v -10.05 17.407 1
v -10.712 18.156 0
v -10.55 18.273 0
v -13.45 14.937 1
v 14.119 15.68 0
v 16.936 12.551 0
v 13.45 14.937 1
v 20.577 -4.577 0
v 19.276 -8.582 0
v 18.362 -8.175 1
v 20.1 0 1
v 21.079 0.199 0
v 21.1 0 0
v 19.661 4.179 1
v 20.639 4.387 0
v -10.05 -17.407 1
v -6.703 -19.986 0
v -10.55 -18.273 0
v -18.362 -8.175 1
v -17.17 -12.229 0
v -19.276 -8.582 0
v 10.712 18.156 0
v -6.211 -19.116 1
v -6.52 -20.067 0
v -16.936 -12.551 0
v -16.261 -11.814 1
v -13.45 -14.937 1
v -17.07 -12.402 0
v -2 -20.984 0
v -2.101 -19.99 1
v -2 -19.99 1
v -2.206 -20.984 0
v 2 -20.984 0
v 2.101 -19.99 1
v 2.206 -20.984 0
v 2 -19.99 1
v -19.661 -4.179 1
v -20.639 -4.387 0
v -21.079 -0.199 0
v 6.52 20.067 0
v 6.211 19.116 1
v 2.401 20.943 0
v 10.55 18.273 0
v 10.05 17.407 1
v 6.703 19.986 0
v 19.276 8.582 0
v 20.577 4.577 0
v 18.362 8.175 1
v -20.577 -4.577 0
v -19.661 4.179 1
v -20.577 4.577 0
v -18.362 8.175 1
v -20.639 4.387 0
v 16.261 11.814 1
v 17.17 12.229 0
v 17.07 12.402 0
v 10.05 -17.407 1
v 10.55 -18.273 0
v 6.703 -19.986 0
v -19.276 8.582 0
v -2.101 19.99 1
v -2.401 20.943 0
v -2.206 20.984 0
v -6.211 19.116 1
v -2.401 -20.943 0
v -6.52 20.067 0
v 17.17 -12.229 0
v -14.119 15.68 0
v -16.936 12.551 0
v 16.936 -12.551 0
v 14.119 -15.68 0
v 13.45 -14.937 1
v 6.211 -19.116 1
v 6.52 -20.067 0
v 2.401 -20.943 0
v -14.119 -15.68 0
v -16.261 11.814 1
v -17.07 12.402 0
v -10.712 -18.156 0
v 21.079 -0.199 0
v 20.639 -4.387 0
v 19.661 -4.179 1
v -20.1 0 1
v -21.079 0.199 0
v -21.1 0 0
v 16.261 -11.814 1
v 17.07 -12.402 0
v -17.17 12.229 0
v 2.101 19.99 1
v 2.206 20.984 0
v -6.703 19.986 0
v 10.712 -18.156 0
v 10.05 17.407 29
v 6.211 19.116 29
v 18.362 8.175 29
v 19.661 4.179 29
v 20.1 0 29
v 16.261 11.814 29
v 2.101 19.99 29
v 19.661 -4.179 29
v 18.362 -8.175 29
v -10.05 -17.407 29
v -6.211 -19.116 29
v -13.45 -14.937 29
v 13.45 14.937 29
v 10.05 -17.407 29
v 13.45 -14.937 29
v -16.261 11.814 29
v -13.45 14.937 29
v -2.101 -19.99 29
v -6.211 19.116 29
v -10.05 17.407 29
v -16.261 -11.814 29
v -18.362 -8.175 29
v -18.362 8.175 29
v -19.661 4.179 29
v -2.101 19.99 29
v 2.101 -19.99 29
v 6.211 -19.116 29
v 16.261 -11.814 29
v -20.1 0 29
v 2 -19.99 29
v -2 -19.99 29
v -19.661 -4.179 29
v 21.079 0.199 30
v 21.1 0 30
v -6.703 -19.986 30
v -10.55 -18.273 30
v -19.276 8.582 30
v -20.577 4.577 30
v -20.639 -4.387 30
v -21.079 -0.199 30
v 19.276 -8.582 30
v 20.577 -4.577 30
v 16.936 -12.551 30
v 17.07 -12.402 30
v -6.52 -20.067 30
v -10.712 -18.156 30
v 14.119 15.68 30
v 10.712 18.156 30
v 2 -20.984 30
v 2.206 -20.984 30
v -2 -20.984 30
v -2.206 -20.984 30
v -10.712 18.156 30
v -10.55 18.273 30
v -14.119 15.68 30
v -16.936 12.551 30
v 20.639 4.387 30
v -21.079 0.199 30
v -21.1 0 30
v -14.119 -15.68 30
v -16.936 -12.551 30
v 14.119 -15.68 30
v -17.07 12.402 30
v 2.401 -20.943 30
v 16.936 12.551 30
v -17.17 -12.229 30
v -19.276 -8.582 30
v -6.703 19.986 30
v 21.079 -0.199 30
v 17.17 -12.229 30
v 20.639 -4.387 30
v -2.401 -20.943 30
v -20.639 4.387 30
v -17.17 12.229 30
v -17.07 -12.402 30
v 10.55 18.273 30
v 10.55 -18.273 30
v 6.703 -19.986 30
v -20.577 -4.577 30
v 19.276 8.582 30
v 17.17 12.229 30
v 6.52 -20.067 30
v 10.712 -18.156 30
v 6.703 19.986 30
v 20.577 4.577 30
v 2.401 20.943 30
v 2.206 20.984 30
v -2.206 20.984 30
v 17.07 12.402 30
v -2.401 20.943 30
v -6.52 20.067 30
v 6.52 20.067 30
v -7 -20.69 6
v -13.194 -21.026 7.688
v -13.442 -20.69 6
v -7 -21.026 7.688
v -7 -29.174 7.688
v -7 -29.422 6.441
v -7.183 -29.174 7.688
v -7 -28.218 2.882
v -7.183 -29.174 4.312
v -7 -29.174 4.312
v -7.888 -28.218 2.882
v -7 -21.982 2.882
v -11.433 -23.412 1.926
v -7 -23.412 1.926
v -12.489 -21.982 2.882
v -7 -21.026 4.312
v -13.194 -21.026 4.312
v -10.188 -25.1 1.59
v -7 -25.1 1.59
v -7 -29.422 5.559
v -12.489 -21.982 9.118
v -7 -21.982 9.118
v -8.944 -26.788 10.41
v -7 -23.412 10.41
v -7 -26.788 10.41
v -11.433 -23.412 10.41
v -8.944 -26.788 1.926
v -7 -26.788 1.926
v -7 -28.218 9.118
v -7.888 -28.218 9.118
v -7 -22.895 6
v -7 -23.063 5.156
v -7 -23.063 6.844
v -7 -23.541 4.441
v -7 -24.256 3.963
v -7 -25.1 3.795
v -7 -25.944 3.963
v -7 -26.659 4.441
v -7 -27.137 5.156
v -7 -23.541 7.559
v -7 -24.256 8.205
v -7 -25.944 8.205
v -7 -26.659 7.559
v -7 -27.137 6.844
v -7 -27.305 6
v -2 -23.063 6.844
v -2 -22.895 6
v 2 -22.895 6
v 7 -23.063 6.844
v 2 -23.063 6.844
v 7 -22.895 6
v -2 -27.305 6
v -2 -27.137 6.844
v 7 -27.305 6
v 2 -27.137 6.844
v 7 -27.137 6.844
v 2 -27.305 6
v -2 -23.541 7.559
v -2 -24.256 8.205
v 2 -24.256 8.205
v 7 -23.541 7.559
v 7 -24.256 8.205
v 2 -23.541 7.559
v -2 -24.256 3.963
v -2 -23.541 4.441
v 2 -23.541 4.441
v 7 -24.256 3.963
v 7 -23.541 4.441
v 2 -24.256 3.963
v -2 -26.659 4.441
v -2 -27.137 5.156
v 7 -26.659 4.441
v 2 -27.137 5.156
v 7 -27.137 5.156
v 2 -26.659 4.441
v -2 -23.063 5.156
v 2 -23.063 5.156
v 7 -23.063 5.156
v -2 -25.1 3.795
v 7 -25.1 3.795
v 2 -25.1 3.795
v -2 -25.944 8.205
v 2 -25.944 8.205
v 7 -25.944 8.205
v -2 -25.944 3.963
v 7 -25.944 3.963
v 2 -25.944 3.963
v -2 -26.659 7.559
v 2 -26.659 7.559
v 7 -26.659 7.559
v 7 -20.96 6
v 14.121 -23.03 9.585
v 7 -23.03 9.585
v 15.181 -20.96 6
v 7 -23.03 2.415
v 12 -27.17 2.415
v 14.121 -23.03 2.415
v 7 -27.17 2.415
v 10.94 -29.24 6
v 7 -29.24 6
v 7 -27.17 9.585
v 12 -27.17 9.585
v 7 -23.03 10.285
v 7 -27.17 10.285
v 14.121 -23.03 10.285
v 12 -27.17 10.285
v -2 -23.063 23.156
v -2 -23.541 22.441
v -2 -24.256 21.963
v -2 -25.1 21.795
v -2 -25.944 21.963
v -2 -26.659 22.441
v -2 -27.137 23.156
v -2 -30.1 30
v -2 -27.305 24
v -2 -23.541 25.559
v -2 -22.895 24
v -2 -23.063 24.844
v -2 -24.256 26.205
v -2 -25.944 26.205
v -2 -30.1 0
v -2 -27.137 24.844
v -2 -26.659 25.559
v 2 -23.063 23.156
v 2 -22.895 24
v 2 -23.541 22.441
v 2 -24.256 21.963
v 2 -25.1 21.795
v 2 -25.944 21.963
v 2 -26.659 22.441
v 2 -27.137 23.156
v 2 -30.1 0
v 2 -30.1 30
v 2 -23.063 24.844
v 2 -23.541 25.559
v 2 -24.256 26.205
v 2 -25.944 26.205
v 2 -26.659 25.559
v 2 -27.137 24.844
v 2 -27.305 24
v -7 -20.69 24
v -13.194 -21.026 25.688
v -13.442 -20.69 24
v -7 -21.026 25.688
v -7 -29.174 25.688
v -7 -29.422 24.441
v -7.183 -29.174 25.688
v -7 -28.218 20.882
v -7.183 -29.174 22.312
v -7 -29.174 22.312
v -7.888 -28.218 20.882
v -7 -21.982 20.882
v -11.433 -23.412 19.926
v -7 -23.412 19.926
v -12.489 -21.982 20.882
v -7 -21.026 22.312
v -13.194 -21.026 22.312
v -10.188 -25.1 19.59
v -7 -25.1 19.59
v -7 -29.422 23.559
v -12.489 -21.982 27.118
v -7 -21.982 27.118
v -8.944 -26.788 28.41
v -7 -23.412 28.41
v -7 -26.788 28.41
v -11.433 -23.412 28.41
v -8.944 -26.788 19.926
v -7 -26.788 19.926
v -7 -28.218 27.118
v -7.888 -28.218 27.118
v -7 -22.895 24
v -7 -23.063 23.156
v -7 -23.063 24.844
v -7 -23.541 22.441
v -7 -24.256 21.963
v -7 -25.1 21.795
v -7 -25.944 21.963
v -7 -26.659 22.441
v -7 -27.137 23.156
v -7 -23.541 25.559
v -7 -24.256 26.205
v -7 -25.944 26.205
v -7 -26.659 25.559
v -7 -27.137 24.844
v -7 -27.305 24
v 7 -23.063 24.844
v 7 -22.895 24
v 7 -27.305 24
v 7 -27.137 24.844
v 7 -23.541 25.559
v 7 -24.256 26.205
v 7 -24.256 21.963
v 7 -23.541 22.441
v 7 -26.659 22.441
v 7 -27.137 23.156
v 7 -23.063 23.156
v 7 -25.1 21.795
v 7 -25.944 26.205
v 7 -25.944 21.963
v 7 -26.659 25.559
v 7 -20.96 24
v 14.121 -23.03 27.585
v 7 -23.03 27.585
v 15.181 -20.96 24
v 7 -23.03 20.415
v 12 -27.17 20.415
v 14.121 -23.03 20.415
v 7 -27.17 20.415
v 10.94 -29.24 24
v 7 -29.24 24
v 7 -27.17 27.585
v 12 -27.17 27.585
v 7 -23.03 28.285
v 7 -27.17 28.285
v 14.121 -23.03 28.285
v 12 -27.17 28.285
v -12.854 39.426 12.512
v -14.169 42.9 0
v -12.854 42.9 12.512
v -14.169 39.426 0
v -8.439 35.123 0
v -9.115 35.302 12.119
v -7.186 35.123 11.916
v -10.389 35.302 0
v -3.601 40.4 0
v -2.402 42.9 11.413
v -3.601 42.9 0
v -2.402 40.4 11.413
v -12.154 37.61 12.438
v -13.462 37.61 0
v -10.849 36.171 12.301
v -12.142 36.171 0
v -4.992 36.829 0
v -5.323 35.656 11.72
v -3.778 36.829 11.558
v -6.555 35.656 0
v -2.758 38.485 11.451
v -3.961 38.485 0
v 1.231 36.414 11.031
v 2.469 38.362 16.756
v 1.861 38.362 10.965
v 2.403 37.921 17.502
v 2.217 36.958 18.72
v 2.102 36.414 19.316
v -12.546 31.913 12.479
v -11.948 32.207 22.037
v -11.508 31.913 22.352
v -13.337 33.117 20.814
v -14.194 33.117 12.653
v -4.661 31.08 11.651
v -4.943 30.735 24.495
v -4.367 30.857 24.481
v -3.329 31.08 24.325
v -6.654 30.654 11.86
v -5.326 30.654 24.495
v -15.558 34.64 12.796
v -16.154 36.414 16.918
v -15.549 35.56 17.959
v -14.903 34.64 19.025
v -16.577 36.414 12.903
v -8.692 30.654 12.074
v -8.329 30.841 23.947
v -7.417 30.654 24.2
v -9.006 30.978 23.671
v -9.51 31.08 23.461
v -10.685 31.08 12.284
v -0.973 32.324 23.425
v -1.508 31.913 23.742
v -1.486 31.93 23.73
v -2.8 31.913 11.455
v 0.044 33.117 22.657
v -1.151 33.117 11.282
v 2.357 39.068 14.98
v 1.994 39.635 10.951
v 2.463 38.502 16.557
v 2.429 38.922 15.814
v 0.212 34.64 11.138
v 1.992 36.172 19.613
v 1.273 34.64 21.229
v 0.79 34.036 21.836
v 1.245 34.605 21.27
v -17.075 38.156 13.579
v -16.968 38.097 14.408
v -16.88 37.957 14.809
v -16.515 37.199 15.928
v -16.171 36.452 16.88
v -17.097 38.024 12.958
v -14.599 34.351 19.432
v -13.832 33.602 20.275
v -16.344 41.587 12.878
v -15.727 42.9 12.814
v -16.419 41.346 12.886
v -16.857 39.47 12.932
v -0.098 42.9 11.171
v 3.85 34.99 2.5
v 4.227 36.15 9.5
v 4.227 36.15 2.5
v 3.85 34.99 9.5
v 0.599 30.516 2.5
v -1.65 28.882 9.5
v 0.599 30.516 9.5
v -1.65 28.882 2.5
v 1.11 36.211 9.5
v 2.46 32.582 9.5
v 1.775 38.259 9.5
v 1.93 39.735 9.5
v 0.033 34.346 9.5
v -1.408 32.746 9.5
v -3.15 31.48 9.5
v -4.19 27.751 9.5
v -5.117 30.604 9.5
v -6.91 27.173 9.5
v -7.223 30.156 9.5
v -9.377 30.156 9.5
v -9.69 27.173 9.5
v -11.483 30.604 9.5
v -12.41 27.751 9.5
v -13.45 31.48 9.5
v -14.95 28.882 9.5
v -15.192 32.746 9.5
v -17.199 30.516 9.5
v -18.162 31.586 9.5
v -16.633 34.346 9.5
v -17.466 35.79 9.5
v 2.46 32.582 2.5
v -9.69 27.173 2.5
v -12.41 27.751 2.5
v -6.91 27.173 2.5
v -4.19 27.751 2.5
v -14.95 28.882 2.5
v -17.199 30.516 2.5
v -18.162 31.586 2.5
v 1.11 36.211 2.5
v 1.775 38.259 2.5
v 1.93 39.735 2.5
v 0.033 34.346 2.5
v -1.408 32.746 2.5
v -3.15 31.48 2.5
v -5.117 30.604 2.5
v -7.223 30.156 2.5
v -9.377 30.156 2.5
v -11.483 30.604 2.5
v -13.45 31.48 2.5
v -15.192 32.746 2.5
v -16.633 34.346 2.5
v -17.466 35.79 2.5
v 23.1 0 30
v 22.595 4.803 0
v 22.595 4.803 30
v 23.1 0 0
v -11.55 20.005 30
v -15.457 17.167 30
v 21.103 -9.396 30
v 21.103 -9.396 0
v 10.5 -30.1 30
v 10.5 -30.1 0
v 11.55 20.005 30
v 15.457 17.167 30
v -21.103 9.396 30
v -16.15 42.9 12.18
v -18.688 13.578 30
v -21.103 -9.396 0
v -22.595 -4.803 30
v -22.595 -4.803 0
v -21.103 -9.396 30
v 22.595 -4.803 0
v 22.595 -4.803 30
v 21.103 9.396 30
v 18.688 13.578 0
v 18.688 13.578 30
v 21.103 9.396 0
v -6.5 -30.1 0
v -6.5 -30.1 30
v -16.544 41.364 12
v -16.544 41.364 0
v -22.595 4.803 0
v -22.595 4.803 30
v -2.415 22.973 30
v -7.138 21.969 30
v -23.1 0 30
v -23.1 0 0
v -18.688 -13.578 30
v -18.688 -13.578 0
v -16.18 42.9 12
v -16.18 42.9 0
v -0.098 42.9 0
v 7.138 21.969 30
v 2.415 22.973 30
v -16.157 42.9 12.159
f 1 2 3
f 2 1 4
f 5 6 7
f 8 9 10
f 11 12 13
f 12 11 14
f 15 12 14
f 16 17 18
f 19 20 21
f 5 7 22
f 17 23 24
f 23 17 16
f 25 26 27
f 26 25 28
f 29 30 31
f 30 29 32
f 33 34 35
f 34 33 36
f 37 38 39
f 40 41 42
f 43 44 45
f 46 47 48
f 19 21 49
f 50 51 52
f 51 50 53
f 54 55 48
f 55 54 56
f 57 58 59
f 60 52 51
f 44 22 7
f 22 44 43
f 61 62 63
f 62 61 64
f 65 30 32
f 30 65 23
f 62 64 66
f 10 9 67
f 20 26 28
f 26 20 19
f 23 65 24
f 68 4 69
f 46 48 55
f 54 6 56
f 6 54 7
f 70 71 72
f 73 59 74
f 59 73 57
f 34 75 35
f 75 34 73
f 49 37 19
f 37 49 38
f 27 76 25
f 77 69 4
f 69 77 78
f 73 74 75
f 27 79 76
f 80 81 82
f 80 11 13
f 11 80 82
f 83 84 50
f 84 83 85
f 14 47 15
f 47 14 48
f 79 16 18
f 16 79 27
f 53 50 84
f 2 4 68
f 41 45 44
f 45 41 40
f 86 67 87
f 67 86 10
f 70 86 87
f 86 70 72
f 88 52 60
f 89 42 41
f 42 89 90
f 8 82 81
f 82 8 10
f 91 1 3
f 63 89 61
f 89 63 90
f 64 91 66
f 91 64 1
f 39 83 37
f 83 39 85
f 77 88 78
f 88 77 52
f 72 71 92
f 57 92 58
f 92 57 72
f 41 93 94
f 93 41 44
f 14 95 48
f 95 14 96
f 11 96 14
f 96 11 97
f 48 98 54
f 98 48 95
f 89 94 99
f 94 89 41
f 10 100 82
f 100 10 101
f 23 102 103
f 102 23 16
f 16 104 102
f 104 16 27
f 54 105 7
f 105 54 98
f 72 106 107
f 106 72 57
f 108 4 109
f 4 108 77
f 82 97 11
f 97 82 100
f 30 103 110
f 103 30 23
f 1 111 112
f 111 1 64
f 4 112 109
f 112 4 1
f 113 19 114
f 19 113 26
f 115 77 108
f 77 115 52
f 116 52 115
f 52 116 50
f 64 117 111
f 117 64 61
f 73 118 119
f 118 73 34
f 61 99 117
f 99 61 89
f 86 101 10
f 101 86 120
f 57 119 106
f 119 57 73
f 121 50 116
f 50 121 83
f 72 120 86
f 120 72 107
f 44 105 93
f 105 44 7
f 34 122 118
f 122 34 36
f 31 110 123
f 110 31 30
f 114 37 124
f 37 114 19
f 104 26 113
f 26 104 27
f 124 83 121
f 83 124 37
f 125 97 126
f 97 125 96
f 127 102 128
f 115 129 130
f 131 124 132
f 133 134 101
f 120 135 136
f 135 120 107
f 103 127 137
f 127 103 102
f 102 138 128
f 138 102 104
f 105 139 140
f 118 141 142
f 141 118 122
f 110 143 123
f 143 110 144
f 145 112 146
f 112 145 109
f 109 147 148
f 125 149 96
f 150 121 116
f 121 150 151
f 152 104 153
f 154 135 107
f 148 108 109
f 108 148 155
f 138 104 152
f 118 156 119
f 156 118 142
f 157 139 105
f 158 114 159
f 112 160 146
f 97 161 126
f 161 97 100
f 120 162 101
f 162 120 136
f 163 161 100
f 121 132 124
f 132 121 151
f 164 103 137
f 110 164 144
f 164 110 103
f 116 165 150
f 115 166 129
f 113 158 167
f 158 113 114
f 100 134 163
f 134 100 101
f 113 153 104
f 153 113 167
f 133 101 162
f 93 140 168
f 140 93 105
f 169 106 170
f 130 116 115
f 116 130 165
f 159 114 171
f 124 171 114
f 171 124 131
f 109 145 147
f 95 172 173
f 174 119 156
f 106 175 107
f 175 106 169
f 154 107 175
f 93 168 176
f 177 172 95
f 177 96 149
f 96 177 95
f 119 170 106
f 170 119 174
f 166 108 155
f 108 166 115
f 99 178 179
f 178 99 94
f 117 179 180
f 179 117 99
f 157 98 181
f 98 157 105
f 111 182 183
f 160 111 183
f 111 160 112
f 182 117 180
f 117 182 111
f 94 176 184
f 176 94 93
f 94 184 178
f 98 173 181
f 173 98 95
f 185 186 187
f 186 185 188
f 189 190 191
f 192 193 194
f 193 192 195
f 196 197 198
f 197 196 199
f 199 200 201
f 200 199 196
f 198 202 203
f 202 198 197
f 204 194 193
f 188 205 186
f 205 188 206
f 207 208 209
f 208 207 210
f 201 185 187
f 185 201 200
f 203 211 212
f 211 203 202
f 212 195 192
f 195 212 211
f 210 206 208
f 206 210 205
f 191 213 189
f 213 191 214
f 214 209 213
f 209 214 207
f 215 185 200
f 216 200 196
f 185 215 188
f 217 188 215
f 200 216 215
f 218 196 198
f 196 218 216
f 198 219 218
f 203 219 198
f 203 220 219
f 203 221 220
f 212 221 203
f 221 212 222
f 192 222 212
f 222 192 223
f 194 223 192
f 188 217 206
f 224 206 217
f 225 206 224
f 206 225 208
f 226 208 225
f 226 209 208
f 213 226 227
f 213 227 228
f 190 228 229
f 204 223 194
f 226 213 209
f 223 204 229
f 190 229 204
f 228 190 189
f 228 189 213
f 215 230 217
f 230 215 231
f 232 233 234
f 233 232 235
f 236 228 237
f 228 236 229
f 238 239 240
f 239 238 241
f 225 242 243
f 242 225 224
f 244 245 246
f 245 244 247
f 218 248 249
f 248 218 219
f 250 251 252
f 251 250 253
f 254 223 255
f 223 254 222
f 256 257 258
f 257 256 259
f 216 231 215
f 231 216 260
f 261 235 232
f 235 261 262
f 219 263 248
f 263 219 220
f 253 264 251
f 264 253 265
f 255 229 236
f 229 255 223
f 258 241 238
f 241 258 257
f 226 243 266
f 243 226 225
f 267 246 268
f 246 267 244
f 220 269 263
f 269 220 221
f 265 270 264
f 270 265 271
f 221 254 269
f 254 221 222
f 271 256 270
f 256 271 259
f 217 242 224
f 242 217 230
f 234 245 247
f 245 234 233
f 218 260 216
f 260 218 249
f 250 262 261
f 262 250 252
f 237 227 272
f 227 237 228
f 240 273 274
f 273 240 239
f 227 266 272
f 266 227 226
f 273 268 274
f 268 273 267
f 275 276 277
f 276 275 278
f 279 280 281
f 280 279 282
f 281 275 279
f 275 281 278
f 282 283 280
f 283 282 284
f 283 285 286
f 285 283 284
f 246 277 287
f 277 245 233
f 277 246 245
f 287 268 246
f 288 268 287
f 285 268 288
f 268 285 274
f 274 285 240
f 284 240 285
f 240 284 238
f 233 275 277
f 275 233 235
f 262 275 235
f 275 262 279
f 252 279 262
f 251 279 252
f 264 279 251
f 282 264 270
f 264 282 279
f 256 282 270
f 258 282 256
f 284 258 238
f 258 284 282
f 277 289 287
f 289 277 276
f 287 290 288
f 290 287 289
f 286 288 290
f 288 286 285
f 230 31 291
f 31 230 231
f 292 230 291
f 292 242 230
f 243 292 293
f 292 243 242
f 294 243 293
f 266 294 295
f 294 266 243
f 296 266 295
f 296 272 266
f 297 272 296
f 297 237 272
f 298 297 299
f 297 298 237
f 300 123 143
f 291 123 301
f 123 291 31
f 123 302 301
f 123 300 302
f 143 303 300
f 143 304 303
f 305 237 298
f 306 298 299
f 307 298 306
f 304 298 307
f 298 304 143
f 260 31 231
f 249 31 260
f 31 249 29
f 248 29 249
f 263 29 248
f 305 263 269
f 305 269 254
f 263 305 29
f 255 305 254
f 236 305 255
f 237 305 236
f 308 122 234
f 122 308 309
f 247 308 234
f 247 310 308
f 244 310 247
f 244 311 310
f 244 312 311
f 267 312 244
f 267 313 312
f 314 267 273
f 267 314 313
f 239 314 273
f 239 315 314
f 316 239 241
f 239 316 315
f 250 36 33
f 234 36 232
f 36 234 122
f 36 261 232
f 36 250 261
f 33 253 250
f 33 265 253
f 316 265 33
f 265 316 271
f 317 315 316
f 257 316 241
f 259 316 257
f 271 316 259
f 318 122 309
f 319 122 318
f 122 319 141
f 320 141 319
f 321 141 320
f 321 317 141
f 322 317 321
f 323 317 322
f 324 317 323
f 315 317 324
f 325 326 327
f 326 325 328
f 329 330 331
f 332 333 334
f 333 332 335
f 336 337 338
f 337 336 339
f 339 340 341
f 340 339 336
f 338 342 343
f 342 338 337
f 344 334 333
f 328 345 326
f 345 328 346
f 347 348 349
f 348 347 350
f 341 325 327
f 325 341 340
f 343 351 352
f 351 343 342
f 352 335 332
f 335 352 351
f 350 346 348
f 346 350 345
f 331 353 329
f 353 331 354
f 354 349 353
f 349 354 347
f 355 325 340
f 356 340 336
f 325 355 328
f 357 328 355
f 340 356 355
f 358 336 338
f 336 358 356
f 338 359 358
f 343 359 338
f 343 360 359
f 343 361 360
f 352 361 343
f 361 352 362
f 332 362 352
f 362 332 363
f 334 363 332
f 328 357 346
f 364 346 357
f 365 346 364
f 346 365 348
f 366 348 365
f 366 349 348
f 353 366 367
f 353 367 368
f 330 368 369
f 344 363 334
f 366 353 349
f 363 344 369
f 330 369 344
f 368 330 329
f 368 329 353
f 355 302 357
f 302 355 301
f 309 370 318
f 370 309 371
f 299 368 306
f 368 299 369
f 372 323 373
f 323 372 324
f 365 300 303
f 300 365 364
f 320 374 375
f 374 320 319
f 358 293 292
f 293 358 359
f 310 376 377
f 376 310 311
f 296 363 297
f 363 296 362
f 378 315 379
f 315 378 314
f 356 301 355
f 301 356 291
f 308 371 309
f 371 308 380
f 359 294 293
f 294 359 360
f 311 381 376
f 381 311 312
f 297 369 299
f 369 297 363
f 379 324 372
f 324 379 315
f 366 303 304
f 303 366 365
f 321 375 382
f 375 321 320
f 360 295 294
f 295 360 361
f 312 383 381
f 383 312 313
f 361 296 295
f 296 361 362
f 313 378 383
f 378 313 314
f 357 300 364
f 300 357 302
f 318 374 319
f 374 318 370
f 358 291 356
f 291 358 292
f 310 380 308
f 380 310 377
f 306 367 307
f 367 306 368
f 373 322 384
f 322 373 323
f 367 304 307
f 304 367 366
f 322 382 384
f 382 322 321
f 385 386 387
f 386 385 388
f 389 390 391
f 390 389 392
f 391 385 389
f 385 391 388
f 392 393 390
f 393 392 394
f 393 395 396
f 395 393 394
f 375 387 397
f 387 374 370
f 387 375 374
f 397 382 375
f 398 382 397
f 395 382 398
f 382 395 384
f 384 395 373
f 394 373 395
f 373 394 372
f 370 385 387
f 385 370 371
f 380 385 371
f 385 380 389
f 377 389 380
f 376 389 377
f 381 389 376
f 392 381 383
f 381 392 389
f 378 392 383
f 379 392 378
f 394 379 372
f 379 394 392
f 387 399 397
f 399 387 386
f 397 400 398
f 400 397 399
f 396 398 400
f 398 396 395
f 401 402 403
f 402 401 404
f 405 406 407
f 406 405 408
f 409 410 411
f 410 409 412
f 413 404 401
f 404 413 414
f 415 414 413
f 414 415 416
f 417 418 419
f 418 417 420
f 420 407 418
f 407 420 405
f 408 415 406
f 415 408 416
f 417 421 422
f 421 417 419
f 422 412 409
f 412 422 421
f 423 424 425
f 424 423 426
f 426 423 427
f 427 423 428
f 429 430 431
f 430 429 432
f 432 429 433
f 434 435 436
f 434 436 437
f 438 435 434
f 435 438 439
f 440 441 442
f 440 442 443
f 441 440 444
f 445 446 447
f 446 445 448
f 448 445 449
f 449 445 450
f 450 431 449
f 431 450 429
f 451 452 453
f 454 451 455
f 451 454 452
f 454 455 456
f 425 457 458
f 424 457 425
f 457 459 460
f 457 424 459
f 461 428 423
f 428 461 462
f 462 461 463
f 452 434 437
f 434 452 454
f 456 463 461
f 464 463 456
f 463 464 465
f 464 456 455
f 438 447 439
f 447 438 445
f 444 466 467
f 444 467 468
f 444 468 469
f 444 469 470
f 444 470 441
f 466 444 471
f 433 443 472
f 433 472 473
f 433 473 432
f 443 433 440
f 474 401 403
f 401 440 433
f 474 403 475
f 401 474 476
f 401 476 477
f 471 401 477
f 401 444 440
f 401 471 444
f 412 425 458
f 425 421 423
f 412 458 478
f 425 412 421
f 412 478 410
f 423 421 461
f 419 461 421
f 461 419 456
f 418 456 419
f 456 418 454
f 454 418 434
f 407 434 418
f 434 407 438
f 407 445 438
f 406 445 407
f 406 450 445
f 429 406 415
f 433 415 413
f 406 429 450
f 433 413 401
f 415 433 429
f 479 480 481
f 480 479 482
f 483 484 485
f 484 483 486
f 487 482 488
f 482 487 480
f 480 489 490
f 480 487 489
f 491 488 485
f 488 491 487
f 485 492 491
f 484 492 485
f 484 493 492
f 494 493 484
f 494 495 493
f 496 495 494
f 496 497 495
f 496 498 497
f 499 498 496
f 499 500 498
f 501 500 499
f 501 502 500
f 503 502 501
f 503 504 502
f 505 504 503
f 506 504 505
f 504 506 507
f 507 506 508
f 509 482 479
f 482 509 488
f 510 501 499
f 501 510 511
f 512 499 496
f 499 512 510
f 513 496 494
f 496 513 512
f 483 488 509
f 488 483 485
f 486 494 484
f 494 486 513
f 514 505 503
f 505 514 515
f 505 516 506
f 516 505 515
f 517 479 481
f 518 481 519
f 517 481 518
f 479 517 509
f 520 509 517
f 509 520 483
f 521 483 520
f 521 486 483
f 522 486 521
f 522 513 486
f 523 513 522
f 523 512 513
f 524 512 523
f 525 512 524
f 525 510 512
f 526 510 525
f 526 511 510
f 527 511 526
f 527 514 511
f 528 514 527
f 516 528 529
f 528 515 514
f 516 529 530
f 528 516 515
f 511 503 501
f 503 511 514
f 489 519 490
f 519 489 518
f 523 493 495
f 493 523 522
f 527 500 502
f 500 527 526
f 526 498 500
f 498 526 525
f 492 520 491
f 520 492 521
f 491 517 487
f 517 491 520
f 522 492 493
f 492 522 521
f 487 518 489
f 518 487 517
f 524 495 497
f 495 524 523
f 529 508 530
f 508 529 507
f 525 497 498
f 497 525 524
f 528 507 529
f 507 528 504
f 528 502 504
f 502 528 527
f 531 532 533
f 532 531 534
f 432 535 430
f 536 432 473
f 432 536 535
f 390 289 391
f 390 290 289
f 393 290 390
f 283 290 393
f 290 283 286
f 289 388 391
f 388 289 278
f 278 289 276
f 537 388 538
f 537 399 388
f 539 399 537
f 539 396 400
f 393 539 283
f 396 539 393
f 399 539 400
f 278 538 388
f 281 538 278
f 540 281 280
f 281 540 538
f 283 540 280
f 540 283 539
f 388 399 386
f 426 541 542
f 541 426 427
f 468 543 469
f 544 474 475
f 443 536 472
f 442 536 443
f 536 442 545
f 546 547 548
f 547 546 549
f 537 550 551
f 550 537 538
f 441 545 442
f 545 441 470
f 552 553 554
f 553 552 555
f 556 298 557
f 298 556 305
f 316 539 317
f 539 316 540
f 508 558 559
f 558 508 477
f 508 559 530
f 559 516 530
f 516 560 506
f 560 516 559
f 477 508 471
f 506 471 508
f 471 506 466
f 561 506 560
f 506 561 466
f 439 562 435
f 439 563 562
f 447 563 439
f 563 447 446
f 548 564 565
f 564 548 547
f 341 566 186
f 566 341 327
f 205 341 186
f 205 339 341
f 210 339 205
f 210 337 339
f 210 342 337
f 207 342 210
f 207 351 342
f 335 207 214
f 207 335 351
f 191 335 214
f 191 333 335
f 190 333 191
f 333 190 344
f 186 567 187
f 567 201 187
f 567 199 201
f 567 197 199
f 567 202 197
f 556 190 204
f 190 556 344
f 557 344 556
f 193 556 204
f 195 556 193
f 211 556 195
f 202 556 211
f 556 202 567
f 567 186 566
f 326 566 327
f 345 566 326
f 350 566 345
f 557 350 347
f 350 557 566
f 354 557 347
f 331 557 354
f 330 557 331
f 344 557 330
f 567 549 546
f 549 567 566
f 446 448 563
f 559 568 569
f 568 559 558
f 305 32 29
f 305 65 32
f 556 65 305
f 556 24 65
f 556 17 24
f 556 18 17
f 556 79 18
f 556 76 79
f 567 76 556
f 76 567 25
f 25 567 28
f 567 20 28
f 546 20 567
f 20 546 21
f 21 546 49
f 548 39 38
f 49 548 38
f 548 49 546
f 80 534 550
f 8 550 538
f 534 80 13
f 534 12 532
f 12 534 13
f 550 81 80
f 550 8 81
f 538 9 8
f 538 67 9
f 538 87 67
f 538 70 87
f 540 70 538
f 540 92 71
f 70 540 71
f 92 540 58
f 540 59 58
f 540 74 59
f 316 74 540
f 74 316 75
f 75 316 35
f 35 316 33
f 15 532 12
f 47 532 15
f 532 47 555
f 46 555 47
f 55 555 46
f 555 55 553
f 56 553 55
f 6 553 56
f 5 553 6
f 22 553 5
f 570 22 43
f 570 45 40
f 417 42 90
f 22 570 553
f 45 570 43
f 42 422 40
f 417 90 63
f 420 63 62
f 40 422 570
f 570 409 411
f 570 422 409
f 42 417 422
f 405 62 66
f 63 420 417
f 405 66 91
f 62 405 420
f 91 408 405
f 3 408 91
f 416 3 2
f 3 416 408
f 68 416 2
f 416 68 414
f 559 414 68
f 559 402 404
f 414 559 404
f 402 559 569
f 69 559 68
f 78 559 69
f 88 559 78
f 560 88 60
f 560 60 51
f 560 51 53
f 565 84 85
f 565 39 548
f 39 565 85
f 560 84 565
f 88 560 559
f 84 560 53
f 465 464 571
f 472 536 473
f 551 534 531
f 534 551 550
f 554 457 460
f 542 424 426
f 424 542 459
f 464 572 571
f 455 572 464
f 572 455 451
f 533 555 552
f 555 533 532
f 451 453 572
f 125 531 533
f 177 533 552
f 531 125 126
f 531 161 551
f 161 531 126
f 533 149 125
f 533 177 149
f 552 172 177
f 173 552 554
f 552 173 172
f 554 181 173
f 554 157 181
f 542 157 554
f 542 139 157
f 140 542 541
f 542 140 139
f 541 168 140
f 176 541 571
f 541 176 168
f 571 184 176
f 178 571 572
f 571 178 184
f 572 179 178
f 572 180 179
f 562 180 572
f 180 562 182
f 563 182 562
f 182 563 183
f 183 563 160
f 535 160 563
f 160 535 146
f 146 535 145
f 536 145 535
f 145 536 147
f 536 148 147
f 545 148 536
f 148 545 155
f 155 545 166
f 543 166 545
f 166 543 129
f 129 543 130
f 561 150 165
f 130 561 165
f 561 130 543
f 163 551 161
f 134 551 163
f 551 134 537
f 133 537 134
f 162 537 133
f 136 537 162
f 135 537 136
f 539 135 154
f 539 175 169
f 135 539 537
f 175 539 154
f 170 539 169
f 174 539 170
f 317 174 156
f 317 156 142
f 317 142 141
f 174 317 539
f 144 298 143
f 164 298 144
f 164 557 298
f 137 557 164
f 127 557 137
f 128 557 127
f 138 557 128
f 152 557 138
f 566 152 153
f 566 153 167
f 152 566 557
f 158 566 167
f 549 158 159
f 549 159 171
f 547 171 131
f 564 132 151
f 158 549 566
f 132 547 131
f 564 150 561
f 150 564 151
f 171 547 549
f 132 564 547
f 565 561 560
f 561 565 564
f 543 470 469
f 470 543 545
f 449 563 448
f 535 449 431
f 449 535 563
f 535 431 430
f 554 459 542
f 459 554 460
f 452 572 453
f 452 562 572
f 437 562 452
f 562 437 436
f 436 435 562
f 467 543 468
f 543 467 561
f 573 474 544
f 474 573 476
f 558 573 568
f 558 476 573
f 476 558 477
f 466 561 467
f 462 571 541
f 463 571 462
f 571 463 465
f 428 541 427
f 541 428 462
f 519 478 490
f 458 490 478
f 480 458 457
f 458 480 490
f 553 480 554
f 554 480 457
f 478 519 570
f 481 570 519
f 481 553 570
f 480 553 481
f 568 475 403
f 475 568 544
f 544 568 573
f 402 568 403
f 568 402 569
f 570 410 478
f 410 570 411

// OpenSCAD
//use <../standard_optomechanics/cylinder_clamp.scad>;
//use <cylinder_clip.scad>;
use <utilities.scad>;

t = 3;
h = 12;
clamp_h = 30;
inner_r = 20.1;
rack_r = 5+0.3;

tube_to_tube = 15;
c2c_distance = (inner_r + rack_r + tube_to_tube);
//rack_angle = -90-asin( (inner_r - rack_r) / c2c_distance);

d=0.05;

module rack_frame(){
    translate([-rack_r-3,c2c_distance,0]) children();
}

module rack(){
	rack_frame() translate([0,0,h/2]) rotate([0,6,0]){
		hull() repeat([0,999,0],2) cylinder(r=rack_r,h=999*2,center=true);
        translate([0,0,h/2]) cylinder(r=rack_r+4.5,h=999);
    }
}

union(){
	difference(){
		union(){
			hull(){ //this bit holds the rack tube
                cylinder(r=inner_r+t,h=clamp_h);
				rack_frame() cylinder(r=rack_r+3,h=h);
                translate([2,-inner_r-5,clamp_h/2]) cube([17,10,clamp_h],center=true);
			}
		}
        
        chamfered_hole(r=inner_r,h=clamp_h); //hole for seat tube
		translate([0,-inner_r-5,h/2]) rotate(90) pinch_y(4,t=5, nut_l=999,screw_l=10,extra_height=0,gap=[20,4,999]); //clamping screw
		translate([0,-inner_r-5,clamp_h-h/2]) rotate(90) pinch_y(4,t=5, nut_l=999, screw_l=10,extra_height=0); //clamping screw

		//clearance for rack
		rack();
        //cut off so we can get the rack in
		rack_frame() translate([0,2.5+999,0]) cube([1,1,1]*999*2,center=true);
        //cut-out for the velcro tie
        rack_frame() difference(){
            translate([0,0,h/2]) cylinder(r=rack_r+8,h=h-5,center=true);
            cylinder(r=rack_r+5,h=999,center=true);
        }
	}
}
